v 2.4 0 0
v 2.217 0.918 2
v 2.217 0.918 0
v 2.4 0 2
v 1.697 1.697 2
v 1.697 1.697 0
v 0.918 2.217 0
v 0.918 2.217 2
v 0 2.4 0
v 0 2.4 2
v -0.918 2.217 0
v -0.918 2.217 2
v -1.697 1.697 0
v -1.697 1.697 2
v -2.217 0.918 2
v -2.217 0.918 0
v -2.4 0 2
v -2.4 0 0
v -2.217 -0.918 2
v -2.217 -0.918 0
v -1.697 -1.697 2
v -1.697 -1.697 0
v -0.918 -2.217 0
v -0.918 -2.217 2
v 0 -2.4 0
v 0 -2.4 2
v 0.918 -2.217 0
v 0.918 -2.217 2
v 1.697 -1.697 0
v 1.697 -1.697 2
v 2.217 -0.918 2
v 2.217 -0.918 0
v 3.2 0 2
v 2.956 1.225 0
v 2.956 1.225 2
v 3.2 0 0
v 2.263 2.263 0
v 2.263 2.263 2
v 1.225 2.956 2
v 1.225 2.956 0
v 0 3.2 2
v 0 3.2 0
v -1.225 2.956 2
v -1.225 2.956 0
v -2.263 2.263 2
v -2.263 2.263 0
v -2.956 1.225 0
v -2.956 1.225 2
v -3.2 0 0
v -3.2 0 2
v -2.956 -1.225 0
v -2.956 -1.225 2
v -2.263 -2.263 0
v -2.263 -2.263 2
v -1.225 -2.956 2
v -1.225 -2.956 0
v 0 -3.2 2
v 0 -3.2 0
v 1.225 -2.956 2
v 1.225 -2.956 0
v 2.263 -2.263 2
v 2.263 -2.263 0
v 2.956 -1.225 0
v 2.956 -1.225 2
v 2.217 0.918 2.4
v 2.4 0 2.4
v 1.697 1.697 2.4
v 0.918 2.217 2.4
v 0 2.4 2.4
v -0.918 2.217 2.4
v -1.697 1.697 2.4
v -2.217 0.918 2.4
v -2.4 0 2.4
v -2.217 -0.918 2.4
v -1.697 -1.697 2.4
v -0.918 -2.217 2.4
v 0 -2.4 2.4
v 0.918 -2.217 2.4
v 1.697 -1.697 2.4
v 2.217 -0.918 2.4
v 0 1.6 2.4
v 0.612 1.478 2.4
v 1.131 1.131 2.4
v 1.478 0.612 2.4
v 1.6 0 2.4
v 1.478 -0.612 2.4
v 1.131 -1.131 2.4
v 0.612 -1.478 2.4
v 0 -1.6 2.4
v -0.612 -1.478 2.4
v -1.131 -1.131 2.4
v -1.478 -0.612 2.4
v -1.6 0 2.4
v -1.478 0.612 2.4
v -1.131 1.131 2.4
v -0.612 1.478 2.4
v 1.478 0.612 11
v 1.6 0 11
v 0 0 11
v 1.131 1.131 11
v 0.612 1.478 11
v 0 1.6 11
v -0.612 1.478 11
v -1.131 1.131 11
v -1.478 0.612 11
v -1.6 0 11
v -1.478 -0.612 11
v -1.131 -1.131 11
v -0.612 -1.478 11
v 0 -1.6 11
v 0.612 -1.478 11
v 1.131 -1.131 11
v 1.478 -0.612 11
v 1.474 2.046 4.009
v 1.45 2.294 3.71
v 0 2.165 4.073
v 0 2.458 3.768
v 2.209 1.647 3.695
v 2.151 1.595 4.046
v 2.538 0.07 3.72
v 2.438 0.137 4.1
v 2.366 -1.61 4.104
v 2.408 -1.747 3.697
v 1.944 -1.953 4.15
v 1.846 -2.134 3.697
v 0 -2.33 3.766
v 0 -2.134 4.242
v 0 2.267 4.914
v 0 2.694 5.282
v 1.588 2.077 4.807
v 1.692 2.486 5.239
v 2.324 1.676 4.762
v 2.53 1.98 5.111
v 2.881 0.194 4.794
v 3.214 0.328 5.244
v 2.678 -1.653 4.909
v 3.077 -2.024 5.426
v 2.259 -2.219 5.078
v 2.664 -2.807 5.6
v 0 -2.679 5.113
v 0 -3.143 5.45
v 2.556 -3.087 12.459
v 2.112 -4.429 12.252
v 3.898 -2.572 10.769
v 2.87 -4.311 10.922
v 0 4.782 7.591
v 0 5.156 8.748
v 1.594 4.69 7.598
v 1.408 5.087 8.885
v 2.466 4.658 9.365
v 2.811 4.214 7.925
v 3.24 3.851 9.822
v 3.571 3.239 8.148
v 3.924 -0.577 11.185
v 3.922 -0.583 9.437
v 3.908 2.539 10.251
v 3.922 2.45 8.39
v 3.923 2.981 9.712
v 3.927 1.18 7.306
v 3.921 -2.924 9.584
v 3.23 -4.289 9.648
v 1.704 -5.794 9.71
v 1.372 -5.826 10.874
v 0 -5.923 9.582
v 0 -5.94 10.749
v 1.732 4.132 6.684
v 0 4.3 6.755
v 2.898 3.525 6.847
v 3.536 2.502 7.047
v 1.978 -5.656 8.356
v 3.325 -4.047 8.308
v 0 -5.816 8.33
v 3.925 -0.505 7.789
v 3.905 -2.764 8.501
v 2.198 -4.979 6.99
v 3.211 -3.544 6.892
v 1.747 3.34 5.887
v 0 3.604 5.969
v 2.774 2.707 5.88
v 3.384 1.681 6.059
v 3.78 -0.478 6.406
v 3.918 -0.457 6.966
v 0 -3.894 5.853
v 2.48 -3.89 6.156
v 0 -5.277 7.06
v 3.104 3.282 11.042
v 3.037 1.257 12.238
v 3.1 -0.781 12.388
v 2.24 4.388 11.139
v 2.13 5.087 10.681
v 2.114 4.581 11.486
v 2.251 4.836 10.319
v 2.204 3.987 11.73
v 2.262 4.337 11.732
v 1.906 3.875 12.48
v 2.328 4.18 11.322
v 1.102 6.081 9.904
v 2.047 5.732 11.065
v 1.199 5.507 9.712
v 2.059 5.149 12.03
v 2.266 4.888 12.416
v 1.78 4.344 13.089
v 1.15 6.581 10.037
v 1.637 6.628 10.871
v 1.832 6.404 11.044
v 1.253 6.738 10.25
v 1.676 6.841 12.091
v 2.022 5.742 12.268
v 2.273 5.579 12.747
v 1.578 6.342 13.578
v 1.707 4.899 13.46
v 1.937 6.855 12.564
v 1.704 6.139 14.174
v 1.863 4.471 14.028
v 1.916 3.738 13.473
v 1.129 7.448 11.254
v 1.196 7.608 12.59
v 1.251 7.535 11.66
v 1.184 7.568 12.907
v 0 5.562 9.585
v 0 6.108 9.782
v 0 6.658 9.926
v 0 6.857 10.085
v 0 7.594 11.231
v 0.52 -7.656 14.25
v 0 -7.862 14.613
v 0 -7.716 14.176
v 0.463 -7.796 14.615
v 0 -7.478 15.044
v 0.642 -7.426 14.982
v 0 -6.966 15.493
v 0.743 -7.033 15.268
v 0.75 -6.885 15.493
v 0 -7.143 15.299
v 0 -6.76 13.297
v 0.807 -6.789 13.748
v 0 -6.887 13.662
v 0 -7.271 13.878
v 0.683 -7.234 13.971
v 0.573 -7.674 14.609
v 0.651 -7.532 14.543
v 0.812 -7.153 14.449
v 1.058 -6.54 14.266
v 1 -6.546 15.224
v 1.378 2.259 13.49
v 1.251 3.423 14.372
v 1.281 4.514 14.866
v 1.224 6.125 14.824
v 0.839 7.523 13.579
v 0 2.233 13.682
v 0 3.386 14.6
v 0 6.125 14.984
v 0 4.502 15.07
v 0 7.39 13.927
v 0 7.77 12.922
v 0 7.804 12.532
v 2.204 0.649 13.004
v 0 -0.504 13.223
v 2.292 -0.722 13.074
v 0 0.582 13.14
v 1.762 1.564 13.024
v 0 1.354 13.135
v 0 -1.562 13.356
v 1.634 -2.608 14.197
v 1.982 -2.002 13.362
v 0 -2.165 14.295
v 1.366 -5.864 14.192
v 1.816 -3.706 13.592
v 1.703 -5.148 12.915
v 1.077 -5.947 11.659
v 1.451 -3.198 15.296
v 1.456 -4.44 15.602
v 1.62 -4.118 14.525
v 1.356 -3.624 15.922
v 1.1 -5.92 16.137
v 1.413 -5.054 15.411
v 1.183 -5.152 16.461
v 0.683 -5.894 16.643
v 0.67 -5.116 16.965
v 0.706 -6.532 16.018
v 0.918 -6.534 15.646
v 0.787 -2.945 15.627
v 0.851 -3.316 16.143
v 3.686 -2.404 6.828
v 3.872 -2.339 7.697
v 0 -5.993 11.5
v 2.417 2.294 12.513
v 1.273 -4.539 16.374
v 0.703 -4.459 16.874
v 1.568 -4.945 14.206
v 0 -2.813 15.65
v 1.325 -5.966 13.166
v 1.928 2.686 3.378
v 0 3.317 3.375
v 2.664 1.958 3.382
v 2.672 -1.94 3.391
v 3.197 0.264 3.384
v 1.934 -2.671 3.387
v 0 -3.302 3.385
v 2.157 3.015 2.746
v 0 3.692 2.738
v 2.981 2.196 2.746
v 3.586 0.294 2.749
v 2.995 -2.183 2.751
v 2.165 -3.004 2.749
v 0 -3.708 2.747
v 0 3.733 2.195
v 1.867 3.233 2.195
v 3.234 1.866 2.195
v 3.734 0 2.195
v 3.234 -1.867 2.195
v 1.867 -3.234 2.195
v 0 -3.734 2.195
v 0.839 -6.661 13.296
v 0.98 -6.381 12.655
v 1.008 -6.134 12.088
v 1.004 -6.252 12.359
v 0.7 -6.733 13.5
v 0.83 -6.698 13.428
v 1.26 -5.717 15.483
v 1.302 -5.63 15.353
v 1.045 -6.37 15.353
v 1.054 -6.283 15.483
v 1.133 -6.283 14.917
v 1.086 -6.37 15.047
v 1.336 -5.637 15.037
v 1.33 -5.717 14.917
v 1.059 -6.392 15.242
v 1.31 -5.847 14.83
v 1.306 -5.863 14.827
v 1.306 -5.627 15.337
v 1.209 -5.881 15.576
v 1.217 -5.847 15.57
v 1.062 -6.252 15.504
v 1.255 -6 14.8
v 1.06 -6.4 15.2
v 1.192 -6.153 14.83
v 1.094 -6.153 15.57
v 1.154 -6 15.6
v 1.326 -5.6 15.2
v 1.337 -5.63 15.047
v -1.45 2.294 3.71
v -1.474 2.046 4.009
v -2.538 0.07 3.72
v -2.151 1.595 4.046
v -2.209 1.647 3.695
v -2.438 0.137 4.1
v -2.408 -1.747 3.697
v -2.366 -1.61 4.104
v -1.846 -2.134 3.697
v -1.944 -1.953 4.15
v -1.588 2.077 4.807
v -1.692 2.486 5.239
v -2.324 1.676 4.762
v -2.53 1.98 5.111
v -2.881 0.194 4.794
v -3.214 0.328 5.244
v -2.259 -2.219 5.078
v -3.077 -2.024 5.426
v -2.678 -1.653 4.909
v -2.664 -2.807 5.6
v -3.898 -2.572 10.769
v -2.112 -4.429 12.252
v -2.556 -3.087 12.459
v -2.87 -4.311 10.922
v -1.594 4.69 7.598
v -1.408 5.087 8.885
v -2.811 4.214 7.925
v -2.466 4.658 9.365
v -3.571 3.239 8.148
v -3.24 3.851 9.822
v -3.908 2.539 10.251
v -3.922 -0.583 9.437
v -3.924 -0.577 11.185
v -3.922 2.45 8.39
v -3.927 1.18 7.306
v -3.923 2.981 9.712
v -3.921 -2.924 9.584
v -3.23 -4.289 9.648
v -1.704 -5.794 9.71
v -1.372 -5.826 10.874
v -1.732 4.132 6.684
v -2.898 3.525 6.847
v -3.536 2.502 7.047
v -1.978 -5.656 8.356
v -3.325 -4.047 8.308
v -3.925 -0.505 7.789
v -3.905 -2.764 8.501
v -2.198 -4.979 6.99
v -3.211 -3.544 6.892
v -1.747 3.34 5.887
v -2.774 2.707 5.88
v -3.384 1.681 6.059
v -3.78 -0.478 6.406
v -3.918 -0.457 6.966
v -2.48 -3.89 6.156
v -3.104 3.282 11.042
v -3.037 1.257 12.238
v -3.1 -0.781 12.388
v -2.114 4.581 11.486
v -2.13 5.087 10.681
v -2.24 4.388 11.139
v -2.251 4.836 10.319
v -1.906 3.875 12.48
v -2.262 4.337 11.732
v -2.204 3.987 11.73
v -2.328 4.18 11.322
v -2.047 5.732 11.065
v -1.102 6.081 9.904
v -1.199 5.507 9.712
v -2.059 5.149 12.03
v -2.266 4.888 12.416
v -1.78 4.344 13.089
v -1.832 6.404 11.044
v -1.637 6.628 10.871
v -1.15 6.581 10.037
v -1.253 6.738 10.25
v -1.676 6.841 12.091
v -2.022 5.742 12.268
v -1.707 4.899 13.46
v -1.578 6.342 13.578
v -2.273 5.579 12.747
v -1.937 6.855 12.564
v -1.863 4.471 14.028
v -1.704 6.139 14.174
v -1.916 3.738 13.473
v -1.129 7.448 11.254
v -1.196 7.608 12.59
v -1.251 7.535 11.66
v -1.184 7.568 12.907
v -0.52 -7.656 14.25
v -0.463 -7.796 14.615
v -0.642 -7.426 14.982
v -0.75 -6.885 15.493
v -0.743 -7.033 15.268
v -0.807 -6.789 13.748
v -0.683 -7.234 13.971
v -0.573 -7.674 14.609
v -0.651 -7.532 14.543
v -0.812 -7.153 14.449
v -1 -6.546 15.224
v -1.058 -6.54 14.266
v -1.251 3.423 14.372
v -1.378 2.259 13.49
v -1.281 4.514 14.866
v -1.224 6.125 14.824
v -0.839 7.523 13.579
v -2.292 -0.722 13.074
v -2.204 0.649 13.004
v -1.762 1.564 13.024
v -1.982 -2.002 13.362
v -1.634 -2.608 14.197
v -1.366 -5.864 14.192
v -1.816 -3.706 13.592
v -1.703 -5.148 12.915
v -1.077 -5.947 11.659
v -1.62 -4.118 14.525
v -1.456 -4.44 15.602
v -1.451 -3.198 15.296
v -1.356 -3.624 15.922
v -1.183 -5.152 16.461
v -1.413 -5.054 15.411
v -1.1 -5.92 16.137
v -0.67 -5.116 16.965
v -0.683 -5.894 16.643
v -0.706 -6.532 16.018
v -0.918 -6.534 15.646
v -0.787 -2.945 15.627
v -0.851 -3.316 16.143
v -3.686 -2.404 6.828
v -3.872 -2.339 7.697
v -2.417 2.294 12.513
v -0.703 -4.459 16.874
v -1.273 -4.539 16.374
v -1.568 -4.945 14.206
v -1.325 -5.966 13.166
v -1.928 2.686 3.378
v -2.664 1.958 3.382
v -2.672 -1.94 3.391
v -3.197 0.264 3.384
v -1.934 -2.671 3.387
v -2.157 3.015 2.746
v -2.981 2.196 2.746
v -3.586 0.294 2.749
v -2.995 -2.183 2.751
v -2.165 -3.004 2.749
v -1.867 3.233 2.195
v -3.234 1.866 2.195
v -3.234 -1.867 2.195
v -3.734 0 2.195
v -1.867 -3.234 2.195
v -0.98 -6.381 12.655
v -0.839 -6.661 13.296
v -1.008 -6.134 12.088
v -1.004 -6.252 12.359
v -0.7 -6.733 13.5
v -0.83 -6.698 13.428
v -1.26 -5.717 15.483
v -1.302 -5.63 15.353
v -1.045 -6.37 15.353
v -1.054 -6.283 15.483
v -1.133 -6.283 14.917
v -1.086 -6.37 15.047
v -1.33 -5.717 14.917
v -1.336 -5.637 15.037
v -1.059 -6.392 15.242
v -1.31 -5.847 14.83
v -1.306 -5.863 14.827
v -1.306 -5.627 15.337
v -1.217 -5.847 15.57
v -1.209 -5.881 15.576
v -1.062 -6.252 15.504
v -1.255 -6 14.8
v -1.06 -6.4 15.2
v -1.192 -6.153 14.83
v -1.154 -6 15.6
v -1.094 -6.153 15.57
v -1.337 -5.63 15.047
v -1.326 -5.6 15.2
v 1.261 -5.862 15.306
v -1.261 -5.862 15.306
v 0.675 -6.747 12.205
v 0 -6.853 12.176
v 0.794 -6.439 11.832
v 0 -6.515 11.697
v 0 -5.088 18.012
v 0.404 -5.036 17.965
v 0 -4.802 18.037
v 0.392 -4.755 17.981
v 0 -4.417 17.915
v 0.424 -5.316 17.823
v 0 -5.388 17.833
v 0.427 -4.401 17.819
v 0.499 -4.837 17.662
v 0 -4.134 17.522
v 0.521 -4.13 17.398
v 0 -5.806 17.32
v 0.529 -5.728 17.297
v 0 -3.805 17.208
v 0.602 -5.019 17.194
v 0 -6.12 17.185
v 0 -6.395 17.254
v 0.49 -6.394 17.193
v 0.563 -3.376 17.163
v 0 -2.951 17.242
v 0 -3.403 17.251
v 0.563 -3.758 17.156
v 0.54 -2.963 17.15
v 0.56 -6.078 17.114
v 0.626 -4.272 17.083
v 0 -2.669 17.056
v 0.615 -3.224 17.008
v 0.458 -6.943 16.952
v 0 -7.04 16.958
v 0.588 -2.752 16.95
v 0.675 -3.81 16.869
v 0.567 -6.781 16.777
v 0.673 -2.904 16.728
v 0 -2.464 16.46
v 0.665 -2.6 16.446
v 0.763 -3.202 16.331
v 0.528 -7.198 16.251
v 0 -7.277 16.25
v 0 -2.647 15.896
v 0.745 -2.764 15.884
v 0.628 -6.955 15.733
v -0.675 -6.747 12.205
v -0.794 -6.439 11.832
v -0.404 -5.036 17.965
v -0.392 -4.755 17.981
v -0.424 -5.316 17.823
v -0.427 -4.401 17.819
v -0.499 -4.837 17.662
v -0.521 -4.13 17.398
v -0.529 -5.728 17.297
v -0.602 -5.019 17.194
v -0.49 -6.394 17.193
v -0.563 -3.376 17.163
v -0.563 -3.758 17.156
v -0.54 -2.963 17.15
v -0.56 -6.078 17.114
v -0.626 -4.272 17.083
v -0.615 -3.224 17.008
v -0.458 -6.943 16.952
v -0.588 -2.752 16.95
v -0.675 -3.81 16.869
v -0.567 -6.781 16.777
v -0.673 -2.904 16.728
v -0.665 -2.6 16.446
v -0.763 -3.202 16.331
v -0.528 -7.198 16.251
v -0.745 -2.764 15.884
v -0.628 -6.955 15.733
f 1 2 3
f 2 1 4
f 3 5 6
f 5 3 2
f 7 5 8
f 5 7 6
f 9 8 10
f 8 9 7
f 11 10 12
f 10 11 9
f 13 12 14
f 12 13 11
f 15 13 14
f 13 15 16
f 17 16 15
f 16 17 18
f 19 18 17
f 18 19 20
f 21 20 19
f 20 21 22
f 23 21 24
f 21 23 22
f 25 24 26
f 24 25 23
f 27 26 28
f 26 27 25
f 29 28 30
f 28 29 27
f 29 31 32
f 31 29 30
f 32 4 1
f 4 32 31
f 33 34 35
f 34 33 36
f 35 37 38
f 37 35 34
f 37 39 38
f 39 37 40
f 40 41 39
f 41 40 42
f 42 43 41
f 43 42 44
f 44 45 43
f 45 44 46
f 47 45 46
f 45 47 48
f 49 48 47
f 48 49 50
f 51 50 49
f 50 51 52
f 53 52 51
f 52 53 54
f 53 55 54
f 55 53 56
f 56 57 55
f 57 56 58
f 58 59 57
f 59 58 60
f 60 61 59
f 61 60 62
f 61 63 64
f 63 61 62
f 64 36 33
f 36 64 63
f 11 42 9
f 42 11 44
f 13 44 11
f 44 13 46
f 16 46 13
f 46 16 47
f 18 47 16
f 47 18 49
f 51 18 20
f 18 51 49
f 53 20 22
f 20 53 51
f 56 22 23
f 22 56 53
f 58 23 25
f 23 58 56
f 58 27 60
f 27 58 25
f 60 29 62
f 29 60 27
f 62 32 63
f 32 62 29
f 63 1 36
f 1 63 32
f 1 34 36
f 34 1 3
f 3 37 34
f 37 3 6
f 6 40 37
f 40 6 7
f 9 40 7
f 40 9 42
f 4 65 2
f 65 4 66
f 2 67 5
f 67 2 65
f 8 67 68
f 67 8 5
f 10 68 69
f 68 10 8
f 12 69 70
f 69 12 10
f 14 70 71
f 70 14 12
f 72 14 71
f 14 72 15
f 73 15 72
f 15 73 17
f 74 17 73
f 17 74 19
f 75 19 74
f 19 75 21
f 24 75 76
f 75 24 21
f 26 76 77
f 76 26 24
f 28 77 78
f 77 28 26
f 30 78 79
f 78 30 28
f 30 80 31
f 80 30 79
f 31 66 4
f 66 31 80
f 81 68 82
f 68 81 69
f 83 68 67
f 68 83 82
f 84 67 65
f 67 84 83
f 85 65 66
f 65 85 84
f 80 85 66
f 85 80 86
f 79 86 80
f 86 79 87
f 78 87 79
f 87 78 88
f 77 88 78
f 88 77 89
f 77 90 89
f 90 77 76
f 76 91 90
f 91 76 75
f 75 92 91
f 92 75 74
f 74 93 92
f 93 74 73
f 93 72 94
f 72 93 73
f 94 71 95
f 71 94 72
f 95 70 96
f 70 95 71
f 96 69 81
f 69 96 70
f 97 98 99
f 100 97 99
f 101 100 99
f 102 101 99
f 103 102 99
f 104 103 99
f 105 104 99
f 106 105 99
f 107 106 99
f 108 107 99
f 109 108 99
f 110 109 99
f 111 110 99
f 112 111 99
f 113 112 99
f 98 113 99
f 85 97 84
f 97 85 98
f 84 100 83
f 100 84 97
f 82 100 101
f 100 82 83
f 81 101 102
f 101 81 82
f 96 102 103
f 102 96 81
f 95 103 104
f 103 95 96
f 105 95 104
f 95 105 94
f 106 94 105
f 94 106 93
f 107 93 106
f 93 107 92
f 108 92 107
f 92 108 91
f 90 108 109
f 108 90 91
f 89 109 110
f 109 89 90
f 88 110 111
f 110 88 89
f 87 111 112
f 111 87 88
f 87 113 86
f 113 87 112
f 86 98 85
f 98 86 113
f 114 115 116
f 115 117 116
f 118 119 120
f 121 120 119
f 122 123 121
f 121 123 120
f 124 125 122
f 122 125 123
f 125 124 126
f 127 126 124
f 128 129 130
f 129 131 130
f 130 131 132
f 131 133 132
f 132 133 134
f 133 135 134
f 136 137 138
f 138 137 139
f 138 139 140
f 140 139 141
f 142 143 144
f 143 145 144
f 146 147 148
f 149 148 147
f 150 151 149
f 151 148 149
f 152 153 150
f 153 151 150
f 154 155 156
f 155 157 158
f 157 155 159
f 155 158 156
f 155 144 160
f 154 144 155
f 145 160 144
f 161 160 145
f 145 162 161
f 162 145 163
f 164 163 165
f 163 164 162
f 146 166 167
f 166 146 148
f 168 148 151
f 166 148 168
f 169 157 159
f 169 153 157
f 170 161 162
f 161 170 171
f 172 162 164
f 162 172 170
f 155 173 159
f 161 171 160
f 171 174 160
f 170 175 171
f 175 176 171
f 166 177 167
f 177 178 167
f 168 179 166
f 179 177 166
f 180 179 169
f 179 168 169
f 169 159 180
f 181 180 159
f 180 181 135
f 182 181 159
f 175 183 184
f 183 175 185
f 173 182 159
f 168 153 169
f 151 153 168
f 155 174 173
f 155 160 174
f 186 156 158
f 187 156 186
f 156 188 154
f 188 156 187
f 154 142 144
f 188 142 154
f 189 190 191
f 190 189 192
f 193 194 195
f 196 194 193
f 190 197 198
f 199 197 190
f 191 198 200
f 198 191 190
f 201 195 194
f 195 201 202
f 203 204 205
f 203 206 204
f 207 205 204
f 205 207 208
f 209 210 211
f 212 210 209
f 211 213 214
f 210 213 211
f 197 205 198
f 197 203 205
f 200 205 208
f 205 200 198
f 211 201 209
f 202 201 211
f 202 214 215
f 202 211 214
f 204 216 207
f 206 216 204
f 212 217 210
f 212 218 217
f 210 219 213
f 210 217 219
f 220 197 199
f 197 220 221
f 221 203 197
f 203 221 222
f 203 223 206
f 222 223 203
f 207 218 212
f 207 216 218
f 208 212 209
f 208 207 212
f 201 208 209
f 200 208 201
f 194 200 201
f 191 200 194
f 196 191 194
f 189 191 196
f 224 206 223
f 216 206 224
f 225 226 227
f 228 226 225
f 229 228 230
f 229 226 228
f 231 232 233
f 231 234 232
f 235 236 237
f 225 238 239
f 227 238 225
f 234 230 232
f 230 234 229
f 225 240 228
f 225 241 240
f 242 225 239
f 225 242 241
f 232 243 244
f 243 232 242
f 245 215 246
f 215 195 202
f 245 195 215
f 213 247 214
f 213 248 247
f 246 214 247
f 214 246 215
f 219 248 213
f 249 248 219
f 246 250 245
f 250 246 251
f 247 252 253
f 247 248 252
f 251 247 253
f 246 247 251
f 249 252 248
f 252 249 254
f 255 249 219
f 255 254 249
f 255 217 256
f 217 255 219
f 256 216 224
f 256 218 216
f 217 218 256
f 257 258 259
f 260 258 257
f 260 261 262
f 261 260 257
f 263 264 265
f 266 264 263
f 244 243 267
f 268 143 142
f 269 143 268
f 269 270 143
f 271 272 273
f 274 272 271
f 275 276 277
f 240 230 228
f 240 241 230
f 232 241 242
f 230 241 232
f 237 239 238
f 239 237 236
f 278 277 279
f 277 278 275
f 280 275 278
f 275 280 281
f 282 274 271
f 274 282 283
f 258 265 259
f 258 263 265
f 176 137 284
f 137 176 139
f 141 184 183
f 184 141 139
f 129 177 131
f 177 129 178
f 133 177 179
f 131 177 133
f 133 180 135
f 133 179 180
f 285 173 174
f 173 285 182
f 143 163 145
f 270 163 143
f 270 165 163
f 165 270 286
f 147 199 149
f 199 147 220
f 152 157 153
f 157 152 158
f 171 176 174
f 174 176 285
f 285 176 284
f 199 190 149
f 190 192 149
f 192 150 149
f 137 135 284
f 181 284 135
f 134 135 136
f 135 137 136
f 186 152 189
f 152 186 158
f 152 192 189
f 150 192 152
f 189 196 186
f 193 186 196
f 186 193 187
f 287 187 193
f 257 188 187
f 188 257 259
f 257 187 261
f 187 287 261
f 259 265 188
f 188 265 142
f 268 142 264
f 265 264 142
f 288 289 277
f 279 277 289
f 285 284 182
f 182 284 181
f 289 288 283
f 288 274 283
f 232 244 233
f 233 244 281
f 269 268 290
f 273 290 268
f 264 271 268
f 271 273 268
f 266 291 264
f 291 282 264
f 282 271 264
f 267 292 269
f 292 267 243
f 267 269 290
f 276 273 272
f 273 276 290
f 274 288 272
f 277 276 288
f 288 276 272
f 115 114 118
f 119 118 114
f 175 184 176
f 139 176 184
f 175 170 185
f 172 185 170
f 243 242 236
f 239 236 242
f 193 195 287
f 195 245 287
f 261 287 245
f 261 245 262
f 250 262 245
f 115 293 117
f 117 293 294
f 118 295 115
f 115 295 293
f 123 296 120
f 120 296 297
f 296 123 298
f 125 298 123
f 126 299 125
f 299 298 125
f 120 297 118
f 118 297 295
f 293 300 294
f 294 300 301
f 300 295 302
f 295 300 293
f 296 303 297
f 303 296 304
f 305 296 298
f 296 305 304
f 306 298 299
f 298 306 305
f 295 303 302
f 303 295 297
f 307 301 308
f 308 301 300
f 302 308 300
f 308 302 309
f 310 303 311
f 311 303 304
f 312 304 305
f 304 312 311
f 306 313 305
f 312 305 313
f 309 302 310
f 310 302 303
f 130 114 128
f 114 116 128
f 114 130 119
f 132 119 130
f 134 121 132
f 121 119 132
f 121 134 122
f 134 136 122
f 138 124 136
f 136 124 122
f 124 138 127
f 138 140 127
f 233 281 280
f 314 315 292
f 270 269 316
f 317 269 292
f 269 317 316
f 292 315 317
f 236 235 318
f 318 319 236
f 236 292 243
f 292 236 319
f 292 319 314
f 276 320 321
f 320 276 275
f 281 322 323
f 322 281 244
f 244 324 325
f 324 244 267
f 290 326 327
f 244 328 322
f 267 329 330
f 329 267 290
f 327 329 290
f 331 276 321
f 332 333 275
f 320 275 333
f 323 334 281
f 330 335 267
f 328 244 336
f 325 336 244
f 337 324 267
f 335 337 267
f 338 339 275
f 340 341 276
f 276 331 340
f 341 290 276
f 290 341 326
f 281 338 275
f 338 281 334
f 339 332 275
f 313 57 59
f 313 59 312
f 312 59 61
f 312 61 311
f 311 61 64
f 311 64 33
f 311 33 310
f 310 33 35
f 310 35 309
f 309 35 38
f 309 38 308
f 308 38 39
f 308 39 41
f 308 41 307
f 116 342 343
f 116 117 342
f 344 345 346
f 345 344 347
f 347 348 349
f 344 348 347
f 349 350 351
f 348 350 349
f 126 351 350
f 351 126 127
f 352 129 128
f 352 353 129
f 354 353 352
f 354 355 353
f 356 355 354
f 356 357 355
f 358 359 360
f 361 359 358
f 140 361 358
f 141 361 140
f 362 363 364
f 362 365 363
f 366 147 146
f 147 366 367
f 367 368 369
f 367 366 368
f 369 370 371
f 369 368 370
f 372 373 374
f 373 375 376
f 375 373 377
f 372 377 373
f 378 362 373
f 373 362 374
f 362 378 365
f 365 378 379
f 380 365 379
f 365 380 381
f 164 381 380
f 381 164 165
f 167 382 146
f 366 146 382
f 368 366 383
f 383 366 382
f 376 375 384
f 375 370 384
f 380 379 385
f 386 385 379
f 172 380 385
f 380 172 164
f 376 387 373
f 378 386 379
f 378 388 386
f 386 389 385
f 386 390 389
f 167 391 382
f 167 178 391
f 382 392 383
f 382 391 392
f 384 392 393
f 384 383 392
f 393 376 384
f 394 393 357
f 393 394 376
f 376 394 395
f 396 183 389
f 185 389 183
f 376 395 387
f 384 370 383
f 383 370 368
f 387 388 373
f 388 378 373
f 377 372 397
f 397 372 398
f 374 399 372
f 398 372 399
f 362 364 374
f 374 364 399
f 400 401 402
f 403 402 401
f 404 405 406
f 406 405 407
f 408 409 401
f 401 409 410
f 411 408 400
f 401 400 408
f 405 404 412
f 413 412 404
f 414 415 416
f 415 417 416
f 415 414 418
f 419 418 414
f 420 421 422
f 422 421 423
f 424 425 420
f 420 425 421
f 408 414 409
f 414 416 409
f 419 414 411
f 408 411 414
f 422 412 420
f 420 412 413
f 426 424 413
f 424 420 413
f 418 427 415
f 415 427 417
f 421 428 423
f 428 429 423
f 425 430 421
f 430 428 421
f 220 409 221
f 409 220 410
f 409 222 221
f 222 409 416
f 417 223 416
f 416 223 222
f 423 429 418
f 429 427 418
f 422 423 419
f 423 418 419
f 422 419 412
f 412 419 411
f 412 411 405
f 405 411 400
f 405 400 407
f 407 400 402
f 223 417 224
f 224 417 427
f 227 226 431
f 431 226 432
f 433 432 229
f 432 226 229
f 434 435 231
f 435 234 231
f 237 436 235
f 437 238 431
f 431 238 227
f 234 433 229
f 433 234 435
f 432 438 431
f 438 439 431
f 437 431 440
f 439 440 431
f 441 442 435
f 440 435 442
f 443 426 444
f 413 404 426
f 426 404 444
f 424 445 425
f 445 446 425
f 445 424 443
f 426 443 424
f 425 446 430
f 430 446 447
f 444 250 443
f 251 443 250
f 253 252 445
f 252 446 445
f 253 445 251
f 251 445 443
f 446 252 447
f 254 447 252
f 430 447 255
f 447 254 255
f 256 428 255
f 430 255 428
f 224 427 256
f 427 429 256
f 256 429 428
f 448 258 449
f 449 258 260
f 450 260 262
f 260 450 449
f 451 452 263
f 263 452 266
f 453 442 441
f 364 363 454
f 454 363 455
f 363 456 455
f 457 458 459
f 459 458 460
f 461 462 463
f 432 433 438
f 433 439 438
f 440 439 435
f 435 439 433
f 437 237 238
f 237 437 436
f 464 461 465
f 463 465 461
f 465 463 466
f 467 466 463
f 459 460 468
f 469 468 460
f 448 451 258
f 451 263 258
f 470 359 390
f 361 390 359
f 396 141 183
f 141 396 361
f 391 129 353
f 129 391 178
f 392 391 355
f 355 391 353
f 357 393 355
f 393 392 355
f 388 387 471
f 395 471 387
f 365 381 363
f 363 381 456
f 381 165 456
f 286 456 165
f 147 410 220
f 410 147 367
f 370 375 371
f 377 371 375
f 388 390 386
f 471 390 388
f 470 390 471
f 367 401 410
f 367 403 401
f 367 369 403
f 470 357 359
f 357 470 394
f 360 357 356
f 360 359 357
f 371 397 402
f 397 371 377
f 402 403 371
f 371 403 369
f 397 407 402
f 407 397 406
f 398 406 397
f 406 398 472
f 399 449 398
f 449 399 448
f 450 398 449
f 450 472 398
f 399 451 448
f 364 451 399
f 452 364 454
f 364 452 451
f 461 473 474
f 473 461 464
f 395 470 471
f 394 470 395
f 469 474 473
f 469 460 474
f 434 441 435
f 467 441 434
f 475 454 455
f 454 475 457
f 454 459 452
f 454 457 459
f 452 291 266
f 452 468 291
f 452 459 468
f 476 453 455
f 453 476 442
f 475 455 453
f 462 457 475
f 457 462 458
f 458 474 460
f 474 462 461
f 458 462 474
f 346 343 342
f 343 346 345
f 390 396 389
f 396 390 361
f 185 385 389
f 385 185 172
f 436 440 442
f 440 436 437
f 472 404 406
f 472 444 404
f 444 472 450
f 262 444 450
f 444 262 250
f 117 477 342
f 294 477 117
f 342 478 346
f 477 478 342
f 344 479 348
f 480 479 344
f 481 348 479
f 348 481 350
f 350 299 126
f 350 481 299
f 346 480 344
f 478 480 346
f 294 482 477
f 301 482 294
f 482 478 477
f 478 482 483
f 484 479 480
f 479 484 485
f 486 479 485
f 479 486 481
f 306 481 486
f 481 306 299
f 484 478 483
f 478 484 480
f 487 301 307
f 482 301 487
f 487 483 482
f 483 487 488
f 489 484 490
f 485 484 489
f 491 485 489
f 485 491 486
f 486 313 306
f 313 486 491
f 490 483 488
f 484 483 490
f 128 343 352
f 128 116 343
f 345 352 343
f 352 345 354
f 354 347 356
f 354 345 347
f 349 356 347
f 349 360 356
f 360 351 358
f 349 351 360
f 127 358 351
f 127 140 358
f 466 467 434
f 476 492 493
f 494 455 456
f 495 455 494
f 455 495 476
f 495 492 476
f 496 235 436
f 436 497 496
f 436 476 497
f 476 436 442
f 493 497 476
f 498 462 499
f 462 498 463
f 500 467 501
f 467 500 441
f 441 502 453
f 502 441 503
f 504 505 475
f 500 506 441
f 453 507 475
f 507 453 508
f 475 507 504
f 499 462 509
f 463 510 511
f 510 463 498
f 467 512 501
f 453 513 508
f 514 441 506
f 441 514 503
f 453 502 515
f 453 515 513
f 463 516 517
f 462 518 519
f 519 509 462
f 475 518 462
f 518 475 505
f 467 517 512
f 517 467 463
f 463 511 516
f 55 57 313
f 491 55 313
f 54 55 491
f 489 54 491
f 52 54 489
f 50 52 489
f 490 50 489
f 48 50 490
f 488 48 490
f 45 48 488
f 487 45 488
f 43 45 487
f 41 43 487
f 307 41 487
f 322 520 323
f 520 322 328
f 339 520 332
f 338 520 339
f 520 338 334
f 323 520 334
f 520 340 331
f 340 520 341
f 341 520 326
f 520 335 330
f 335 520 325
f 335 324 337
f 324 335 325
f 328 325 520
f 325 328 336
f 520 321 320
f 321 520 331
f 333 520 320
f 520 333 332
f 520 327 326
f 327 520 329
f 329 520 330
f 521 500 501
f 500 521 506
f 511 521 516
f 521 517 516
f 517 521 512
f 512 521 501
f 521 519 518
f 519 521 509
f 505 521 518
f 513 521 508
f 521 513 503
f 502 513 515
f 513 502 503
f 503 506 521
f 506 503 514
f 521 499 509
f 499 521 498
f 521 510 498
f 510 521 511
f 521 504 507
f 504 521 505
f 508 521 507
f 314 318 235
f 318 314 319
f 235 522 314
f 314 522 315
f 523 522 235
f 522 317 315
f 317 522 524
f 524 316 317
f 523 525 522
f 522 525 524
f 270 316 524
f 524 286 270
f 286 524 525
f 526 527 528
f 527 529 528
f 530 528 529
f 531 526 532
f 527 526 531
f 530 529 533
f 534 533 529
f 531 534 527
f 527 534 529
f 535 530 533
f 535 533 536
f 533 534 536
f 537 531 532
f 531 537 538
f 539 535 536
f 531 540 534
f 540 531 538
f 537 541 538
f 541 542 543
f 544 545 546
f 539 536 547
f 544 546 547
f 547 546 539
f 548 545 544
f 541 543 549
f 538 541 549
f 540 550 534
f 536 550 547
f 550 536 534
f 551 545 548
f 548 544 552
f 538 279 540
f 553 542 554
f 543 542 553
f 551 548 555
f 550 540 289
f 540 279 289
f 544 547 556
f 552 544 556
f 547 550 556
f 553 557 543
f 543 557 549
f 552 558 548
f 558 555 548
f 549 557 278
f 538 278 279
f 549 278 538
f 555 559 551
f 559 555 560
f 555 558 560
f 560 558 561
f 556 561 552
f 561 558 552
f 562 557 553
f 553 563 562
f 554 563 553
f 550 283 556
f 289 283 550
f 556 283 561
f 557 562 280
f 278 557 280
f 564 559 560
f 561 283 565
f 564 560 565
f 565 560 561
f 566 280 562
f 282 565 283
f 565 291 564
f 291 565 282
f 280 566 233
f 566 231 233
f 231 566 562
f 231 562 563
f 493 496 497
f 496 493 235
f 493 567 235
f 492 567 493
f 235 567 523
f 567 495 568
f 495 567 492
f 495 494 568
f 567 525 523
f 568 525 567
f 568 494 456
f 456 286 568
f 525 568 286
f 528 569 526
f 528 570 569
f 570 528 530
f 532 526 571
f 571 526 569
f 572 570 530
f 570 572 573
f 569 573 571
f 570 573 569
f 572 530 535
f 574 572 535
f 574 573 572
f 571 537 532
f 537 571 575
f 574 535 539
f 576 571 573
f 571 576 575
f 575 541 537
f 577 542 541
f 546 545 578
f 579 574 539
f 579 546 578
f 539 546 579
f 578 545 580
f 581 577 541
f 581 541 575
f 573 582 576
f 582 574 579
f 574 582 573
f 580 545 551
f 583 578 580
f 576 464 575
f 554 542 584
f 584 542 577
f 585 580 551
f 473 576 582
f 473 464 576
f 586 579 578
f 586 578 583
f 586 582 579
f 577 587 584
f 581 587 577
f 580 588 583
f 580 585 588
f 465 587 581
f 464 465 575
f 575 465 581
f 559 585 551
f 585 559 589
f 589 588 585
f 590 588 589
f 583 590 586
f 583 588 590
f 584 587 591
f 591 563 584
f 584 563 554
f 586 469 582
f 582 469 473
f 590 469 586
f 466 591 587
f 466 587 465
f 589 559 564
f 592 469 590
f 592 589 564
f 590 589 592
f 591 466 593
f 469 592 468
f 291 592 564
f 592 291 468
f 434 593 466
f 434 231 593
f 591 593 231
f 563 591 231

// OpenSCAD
use <../lib.scad>
use <95342p01.scad>
$fa=1; $fs=0.2;
function ldraw_lib__4624282(realsolid=false) = [
// 0 ~_Animal Chicken with Red Comb Pattern Dark Tan (Obsolete)
// 0 Name: 4624282.dat
// 0 Author: [PTadmin]
// 0 !LDRAW_ORG Part Physical_Colour UPDATE 2019-02
// 0 !LICENSE Licensed under CC BY 2.0 and CC BY 4.0 : see CAreadme.txt
// 
// 0 BFC CERTIFY CCW
  [0,"BFC","CERTIFY"],
  [0,"BFC","CCW"],
// 
// 0 !HISTORY 2011-12-29 [PTadmin] Official Update 2011-02
// 0 !HISTORY 2019-05-29 [Holly-Wood] Obsoleted per decision not to include physical colour parts
// 0 !HISTORY 2019-09-09 [PTadmin] Official Update 2019-02
// 
// 
// 0 // This file is a "shortcut" with the correct number for the actual
// 0 // colouring of the part (Dark Tan).
// 
// 1 28 0 0 0 1 0 0 0 1 0 0 0 1 95342p01.dat
  [1,28,0,0,0,1,0,0,0,1,0,0,0,1, ldraw_lib__95342p01(realsolid)],
];
module ldraw_lib__4624282(step=0, col=false, unit=2/5, alt=false, line=0.2, solid=!$preview)
    makepoly(ldraw_lib__4624282(solid), step=step, col=col, unit=unit, alt=alt, line=line, solid=solid);
ldraw_lib__4624282(line=0.2);
